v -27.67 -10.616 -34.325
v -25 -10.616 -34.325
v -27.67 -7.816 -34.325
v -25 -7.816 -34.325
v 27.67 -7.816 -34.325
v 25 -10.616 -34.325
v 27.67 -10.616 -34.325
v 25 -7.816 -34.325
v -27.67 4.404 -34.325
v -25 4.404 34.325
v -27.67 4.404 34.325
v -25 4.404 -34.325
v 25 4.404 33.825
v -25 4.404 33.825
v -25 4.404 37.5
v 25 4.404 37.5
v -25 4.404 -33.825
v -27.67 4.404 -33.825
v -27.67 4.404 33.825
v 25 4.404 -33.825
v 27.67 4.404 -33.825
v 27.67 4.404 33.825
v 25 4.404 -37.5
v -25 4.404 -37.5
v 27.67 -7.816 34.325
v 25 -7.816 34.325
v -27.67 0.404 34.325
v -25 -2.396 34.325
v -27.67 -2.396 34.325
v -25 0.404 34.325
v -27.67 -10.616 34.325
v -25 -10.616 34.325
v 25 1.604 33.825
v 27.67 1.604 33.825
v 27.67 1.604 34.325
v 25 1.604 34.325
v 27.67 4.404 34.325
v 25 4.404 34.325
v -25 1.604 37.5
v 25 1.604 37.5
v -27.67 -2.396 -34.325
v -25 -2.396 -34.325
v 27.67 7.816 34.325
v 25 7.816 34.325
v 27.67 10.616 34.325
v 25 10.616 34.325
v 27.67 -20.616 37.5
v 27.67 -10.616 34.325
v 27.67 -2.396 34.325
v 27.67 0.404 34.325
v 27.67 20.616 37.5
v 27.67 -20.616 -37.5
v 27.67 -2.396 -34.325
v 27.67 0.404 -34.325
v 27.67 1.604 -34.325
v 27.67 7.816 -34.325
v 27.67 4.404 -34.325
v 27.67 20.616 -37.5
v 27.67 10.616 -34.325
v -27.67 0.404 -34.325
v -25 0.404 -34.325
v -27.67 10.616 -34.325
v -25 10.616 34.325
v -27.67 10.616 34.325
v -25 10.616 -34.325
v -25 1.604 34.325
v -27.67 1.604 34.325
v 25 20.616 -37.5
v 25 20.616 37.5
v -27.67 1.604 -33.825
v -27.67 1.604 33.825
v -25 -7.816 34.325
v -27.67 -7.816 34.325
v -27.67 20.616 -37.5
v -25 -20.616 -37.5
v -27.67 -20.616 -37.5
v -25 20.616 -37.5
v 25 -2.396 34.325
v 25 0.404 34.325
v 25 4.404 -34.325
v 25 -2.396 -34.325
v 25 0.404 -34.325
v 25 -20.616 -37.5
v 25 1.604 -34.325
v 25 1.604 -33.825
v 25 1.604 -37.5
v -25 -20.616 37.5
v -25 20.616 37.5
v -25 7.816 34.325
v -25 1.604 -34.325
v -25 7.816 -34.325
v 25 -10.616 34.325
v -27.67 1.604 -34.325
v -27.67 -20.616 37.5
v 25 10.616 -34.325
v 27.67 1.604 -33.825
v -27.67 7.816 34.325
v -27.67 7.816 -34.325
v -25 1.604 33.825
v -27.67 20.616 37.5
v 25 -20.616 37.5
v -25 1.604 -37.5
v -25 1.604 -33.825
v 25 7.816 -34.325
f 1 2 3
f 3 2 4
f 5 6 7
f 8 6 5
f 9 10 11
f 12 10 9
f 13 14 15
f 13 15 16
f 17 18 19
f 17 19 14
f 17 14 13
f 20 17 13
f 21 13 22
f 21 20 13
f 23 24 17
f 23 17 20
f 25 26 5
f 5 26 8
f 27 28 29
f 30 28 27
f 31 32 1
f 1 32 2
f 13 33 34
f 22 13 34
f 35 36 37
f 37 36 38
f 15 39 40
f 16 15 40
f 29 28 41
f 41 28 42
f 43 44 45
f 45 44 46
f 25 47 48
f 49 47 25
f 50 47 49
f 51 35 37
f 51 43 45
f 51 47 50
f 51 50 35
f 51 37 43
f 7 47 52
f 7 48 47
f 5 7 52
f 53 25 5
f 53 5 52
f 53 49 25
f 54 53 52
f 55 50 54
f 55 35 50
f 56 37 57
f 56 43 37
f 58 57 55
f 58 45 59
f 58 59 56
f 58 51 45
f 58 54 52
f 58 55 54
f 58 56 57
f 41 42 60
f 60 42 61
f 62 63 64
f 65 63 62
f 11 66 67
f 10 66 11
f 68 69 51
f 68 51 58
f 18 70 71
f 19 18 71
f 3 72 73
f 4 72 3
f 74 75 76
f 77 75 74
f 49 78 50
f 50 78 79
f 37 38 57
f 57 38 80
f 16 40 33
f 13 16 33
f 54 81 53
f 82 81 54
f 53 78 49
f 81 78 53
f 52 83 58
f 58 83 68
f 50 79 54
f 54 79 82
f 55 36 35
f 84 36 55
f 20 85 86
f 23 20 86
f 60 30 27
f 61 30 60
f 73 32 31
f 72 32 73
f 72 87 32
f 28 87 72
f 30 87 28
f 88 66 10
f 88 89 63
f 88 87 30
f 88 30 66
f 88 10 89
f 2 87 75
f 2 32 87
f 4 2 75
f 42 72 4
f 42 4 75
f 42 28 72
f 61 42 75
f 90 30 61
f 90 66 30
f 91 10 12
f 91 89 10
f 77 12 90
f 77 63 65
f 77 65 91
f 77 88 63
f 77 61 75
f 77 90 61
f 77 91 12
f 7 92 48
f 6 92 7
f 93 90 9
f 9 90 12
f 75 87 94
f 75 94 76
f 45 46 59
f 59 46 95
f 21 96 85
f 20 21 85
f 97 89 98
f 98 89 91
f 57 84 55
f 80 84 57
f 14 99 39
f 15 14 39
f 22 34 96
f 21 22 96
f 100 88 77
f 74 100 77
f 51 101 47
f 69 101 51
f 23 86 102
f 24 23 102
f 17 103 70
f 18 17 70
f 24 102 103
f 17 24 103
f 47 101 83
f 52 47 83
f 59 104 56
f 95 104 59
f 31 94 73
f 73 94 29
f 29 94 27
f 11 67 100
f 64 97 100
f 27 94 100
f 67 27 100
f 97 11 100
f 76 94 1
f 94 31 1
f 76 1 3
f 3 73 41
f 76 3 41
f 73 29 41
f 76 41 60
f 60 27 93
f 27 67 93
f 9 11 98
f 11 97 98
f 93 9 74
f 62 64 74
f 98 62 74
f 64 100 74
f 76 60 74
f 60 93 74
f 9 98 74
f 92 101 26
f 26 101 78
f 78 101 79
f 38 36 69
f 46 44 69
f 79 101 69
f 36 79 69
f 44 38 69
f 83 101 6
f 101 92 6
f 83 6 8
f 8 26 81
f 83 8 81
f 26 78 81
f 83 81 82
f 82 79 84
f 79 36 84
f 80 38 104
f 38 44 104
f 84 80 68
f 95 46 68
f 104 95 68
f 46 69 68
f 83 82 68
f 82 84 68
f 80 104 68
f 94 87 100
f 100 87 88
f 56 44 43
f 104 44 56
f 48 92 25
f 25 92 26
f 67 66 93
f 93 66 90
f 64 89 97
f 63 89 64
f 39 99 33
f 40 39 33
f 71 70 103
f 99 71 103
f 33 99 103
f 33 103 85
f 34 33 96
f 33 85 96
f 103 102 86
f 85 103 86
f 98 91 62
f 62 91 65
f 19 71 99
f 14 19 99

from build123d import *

# Parameters (mm, degrees)
BOSS_EXTRUDE1_START = 25
SKETCH1_W           = 75
SKETCH1_H           = 41.232
SKETCH1_W_2         = 68.65
SKETCH1_H_2         = 2.8
BOSS_EXTRUDE1_DEPTH = 2.67
BOSS_EXTRUDE2_START = -25
SKETCH1_2_W         = 75
SKETCH1_2_H         = 41.232
SKETCH1_2_W_2       = 68.65
SKETCH1_2_H_2       = 2.8
BOSS_EXTRUDE2_DEPTH = 2.67
BOSS_EXTRUDE3_DEPTH = 2.8


with BuildPart() as part:
    # Sketch1 → Boss-Extrude1 (new body)
    with BuildSketch(Plane(origin=(0, 0, 0), x_dir=(0, 0, -1), z_dir=(1, 0, 0)).offset(BOSS_EXTRUDE1_START)):
        Rectangle(SKETCH1_W, SKETCH1_H)
        with Locations((0, -9.216)):
            Rectangle(SKETCH1_W_2, SKETCH1_H_2, mode=Mode.SUBTRACT)
        with Locations((0, -0.996)):
            Rectangle(SKETCH1_W_2, SKETCH1_H_2, mode=Mode.SUBTRACT)
        with Locations((0, 3.004)):
            Rectangle(SKETCH1_W_2, SKETCH1_H_2, mode=Mode.SUBTRACT)
        with Locations((0, 9.216)):
            Rectangle(SKETCH1_W_2, SKETCH1_H_2, mode=Mode.SUBTRACT)
    extrude(amount=BOSS_EXTRUDE1_DEPTH)


with BuildPart() as body_2:
    # Sketch1<2> → Boss-Extrude2 (new body)
    with BuildSketch(Plane(origin=(0, 0, 0), x_dir=(0, 0, -1), z_dir=(1, 0, 0)).offset(BOSS_EXTRUDE2_START)):
        Rectangle(SKETCH1_2_W, SKETCH1_2_H)
        with Locations((0, -9.216)):
            Rectangle(SKETCH1_2_W_2, SKETCH1_2_H_2, mode=Mode.SUBTRACT)
        with Locations((0, -0.996)):
            Rectangle(SKETCH1_2_W_2, SKETCH1_2_H_2, mode=Mode.SUBTRACT)
        with Locations((0, 3.004)):
            Rectangle(SKETCH1_2_W_2, SKETCH1_2_H_2, mode=Mode.SUBTRACT)
        with Locations((0, 9.216)):
            Rectangle(SKETCH1_2_W_2, SKETCH1_2_H_2, mode=Mode.SUBTRACT)
    extrude(amount=-BOSS_EXTRUDE2_DEPTH)


with BuildPart() as body_3:
    # Sketch2 → Boss-Extrude3 (new body)
    with BuildSketch(Plane(origin=(0, 1.604, 0), x_dir=(1, 0, 0), z_dir=(0, 1, 0))):
        Polygon((-27.67, 33.825), (-27.67, -33.825), (-25, -33.825), (-25, -37.5), (25, -37.5), (25, -33.825), (27.67, -33.825), (27.67, 33.825), (25, 33.825), (25, 37.5), (-25, 37.5), (-25, 33.825), align=None)
    extrude(amount=BOSS_EXTRUDE3_DEPTH)


solid = Compound([part.part, body_2.part, body_3.part])
